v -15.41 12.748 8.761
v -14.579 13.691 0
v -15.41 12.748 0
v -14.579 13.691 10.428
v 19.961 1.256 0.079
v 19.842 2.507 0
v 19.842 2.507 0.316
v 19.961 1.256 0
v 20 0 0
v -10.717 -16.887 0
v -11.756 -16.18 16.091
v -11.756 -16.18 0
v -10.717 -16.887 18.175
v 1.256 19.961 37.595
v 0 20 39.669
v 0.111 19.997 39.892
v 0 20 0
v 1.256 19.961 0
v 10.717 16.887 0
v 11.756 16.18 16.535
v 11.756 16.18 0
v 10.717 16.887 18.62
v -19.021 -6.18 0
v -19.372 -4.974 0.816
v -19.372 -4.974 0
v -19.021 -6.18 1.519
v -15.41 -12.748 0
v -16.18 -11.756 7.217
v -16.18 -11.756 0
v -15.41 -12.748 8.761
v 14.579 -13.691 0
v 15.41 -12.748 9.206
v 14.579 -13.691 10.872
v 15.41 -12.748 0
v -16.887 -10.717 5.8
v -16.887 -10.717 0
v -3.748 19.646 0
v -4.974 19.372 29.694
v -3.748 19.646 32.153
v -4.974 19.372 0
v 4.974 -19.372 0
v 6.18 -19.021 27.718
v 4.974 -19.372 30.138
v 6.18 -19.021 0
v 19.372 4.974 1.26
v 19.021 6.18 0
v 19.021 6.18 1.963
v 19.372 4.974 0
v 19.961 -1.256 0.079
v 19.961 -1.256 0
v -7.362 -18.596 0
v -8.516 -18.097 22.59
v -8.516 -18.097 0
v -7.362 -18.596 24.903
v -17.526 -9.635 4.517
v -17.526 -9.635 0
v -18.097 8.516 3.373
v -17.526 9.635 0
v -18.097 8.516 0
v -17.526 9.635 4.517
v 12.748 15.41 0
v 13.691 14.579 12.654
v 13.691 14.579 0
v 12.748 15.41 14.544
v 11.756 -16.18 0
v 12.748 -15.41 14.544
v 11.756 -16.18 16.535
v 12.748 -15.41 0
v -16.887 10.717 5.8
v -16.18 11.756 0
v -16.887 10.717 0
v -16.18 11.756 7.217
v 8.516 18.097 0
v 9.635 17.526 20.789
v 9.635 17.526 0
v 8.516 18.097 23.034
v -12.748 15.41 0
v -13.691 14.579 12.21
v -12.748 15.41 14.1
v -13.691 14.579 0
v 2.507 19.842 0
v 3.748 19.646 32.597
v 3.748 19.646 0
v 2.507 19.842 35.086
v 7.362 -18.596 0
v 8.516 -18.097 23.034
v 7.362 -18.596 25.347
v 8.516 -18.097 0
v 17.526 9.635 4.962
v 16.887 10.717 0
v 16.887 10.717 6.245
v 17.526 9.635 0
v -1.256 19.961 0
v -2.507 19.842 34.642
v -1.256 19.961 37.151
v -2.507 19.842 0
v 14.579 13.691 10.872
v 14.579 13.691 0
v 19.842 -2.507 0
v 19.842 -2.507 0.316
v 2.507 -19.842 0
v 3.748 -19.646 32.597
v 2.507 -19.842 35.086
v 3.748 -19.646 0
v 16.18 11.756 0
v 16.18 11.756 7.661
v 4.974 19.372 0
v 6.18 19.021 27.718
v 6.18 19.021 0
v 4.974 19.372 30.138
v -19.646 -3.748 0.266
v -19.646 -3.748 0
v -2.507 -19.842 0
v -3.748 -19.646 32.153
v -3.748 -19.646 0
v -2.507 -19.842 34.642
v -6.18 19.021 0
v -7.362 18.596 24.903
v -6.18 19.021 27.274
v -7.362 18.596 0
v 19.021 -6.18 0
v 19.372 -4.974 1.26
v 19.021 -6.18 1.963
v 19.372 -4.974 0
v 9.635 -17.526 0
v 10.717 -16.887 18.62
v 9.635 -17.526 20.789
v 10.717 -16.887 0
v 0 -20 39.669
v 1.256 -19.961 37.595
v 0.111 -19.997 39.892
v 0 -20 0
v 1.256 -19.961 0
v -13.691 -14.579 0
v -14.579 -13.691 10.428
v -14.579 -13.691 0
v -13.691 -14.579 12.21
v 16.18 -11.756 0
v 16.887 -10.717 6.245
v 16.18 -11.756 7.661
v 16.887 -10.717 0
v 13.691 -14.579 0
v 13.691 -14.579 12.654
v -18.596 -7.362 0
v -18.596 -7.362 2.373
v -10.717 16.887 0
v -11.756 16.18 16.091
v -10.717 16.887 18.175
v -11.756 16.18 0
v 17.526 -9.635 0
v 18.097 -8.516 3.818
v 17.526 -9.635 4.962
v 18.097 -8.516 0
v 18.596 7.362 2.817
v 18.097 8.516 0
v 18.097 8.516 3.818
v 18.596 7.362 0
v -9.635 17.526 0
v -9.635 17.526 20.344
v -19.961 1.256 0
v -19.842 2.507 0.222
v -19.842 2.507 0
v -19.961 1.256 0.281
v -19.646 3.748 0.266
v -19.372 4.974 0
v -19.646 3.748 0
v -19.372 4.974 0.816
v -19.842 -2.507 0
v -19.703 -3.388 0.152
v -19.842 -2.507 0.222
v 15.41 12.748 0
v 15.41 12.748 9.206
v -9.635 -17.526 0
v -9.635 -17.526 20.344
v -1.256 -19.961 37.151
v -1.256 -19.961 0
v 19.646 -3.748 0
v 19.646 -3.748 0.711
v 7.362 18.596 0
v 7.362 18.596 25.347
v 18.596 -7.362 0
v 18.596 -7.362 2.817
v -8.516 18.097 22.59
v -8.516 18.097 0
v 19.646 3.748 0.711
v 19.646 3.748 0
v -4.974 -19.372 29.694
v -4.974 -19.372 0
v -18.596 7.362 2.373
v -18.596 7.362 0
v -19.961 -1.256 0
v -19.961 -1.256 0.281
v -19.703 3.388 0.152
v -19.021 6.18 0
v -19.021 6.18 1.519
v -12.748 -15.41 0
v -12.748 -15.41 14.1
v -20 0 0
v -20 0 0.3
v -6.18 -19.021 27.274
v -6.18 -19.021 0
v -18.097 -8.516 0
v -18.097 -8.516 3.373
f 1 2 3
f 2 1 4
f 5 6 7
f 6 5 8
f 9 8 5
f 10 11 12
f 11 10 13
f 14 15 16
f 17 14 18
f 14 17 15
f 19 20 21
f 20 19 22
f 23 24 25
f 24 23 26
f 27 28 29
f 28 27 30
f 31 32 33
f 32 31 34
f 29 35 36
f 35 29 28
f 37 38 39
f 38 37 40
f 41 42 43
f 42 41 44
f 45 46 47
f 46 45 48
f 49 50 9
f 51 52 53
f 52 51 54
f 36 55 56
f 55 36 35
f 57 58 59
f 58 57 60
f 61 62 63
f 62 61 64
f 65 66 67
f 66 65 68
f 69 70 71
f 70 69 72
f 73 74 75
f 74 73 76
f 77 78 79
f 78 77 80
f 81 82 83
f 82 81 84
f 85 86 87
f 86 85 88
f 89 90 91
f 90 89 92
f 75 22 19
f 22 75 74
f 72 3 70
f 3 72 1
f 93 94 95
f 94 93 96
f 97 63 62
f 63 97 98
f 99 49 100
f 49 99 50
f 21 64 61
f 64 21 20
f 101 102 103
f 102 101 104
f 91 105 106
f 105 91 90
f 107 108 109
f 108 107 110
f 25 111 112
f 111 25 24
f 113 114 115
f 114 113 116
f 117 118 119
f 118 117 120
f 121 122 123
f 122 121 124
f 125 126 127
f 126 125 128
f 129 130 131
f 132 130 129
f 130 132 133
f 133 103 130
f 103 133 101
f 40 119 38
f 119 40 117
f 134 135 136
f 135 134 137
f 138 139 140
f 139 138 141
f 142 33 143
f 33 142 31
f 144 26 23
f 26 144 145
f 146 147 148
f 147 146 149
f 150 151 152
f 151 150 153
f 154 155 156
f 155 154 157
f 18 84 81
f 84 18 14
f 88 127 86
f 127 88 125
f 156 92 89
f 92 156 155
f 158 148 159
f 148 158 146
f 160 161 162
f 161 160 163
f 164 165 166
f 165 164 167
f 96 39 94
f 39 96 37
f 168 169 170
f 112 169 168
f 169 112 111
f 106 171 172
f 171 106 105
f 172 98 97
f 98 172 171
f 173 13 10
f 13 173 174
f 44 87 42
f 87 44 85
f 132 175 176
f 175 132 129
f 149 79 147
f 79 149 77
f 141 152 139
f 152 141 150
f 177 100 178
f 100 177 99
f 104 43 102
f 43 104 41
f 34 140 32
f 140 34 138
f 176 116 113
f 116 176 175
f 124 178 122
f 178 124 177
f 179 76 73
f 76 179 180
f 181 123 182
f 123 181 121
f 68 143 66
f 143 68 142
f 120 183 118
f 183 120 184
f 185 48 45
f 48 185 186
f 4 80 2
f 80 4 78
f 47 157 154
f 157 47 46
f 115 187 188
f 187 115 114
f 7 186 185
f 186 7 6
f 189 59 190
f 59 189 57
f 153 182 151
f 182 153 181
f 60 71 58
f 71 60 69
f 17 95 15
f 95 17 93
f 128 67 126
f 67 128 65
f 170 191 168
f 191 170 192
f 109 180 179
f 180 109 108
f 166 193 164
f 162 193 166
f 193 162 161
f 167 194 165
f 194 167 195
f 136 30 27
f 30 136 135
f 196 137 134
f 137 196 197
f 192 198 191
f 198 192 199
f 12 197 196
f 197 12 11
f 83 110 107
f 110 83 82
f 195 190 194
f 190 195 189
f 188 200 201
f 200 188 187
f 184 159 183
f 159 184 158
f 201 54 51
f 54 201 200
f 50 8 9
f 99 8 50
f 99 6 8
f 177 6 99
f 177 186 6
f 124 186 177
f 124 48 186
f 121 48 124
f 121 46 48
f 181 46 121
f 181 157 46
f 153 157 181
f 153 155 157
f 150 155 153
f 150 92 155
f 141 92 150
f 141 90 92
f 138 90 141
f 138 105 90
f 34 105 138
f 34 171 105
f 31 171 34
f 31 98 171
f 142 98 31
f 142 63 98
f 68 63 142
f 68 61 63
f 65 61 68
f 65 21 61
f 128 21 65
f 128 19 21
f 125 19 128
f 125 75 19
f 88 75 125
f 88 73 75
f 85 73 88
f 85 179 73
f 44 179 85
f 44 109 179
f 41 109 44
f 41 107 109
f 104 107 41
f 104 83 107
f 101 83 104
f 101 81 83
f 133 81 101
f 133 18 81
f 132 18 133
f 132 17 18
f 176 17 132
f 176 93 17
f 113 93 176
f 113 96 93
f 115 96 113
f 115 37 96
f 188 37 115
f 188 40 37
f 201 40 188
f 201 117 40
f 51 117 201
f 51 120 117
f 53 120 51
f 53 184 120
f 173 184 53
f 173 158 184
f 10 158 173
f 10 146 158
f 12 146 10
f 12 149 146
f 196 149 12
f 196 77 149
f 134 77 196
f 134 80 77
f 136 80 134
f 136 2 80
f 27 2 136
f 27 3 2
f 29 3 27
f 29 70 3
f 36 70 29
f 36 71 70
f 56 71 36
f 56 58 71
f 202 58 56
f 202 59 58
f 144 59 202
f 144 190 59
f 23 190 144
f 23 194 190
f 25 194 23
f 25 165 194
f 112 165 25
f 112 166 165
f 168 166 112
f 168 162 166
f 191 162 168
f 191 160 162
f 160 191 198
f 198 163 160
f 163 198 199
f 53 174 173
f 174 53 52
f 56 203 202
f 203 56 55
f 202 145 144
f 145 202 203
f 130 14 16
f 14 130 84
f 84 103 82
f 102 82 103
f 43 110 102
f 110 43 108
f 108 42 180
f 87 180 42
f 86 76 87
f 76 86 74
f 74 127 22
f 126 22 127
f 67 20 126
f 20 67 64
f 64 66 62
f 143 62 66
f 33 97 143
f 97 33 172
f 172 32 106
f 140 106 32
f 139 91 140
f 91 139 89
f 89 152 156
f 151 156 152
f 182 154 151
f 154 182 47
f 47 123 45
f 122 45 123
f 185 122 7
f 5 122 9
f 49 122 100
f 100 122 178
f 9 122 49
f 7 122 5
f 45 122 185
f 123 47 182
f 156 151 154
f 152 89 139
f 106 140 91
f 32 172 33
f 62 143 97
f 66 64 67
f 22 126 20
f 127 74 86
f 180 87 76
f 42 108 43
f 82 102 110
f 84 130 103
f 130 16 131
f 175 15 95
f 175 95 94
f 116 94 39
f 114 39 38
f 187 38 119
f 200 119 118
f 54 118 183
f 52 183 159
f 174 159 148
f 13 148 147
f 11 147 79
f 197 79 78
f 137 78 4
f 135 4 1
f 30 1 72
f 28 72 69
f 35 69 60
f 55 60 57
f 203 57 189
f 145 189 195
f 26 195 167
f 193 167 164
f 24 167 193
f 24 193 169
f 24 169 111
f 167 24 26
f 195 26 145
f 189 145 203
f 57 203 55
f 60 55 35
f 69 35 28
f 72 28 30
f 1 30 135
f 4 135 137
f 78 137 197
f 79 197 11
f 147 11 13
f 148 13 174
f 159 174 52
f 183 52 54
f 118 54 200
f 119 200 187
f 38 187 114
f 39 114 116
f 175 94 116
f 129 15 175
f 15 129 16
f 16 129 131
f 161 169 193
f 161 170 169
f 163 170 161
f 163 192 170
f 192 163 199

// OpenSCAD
// Wine-Bottle-Cap.scad
// Produces 3 different views
// Triangle, Circle, Square from 3 sides


difference (){
    cylinder (h = 40, r = 20, $fn=100);
    
    
    translate ([20,-20,0]) rotate ([0,-26.5,0]) 
    cube([40, 40, 60]);
    
    translate ([-55.5,-20,18]) 
    rotate ([0,26.5,0]) 
    cube([40, 40, 60]);
}

// This produces a plate with holes with 3 shapes
/*
difference (){
translate ([110,0,0]) 
    cube([(40*3 + 10 *4), 60, 4], center=true);

translate ([60,0,0]) 
cylinder (h = 20, r = 20, $fn=100, center=true);
    
translate ([110,0,0])  
cube([40, 40, 20], center=true); 
 
translate ([160,0,0]) 
cylinder (h = 20, r = 24, $fn=3, center=true);    
}
*/
